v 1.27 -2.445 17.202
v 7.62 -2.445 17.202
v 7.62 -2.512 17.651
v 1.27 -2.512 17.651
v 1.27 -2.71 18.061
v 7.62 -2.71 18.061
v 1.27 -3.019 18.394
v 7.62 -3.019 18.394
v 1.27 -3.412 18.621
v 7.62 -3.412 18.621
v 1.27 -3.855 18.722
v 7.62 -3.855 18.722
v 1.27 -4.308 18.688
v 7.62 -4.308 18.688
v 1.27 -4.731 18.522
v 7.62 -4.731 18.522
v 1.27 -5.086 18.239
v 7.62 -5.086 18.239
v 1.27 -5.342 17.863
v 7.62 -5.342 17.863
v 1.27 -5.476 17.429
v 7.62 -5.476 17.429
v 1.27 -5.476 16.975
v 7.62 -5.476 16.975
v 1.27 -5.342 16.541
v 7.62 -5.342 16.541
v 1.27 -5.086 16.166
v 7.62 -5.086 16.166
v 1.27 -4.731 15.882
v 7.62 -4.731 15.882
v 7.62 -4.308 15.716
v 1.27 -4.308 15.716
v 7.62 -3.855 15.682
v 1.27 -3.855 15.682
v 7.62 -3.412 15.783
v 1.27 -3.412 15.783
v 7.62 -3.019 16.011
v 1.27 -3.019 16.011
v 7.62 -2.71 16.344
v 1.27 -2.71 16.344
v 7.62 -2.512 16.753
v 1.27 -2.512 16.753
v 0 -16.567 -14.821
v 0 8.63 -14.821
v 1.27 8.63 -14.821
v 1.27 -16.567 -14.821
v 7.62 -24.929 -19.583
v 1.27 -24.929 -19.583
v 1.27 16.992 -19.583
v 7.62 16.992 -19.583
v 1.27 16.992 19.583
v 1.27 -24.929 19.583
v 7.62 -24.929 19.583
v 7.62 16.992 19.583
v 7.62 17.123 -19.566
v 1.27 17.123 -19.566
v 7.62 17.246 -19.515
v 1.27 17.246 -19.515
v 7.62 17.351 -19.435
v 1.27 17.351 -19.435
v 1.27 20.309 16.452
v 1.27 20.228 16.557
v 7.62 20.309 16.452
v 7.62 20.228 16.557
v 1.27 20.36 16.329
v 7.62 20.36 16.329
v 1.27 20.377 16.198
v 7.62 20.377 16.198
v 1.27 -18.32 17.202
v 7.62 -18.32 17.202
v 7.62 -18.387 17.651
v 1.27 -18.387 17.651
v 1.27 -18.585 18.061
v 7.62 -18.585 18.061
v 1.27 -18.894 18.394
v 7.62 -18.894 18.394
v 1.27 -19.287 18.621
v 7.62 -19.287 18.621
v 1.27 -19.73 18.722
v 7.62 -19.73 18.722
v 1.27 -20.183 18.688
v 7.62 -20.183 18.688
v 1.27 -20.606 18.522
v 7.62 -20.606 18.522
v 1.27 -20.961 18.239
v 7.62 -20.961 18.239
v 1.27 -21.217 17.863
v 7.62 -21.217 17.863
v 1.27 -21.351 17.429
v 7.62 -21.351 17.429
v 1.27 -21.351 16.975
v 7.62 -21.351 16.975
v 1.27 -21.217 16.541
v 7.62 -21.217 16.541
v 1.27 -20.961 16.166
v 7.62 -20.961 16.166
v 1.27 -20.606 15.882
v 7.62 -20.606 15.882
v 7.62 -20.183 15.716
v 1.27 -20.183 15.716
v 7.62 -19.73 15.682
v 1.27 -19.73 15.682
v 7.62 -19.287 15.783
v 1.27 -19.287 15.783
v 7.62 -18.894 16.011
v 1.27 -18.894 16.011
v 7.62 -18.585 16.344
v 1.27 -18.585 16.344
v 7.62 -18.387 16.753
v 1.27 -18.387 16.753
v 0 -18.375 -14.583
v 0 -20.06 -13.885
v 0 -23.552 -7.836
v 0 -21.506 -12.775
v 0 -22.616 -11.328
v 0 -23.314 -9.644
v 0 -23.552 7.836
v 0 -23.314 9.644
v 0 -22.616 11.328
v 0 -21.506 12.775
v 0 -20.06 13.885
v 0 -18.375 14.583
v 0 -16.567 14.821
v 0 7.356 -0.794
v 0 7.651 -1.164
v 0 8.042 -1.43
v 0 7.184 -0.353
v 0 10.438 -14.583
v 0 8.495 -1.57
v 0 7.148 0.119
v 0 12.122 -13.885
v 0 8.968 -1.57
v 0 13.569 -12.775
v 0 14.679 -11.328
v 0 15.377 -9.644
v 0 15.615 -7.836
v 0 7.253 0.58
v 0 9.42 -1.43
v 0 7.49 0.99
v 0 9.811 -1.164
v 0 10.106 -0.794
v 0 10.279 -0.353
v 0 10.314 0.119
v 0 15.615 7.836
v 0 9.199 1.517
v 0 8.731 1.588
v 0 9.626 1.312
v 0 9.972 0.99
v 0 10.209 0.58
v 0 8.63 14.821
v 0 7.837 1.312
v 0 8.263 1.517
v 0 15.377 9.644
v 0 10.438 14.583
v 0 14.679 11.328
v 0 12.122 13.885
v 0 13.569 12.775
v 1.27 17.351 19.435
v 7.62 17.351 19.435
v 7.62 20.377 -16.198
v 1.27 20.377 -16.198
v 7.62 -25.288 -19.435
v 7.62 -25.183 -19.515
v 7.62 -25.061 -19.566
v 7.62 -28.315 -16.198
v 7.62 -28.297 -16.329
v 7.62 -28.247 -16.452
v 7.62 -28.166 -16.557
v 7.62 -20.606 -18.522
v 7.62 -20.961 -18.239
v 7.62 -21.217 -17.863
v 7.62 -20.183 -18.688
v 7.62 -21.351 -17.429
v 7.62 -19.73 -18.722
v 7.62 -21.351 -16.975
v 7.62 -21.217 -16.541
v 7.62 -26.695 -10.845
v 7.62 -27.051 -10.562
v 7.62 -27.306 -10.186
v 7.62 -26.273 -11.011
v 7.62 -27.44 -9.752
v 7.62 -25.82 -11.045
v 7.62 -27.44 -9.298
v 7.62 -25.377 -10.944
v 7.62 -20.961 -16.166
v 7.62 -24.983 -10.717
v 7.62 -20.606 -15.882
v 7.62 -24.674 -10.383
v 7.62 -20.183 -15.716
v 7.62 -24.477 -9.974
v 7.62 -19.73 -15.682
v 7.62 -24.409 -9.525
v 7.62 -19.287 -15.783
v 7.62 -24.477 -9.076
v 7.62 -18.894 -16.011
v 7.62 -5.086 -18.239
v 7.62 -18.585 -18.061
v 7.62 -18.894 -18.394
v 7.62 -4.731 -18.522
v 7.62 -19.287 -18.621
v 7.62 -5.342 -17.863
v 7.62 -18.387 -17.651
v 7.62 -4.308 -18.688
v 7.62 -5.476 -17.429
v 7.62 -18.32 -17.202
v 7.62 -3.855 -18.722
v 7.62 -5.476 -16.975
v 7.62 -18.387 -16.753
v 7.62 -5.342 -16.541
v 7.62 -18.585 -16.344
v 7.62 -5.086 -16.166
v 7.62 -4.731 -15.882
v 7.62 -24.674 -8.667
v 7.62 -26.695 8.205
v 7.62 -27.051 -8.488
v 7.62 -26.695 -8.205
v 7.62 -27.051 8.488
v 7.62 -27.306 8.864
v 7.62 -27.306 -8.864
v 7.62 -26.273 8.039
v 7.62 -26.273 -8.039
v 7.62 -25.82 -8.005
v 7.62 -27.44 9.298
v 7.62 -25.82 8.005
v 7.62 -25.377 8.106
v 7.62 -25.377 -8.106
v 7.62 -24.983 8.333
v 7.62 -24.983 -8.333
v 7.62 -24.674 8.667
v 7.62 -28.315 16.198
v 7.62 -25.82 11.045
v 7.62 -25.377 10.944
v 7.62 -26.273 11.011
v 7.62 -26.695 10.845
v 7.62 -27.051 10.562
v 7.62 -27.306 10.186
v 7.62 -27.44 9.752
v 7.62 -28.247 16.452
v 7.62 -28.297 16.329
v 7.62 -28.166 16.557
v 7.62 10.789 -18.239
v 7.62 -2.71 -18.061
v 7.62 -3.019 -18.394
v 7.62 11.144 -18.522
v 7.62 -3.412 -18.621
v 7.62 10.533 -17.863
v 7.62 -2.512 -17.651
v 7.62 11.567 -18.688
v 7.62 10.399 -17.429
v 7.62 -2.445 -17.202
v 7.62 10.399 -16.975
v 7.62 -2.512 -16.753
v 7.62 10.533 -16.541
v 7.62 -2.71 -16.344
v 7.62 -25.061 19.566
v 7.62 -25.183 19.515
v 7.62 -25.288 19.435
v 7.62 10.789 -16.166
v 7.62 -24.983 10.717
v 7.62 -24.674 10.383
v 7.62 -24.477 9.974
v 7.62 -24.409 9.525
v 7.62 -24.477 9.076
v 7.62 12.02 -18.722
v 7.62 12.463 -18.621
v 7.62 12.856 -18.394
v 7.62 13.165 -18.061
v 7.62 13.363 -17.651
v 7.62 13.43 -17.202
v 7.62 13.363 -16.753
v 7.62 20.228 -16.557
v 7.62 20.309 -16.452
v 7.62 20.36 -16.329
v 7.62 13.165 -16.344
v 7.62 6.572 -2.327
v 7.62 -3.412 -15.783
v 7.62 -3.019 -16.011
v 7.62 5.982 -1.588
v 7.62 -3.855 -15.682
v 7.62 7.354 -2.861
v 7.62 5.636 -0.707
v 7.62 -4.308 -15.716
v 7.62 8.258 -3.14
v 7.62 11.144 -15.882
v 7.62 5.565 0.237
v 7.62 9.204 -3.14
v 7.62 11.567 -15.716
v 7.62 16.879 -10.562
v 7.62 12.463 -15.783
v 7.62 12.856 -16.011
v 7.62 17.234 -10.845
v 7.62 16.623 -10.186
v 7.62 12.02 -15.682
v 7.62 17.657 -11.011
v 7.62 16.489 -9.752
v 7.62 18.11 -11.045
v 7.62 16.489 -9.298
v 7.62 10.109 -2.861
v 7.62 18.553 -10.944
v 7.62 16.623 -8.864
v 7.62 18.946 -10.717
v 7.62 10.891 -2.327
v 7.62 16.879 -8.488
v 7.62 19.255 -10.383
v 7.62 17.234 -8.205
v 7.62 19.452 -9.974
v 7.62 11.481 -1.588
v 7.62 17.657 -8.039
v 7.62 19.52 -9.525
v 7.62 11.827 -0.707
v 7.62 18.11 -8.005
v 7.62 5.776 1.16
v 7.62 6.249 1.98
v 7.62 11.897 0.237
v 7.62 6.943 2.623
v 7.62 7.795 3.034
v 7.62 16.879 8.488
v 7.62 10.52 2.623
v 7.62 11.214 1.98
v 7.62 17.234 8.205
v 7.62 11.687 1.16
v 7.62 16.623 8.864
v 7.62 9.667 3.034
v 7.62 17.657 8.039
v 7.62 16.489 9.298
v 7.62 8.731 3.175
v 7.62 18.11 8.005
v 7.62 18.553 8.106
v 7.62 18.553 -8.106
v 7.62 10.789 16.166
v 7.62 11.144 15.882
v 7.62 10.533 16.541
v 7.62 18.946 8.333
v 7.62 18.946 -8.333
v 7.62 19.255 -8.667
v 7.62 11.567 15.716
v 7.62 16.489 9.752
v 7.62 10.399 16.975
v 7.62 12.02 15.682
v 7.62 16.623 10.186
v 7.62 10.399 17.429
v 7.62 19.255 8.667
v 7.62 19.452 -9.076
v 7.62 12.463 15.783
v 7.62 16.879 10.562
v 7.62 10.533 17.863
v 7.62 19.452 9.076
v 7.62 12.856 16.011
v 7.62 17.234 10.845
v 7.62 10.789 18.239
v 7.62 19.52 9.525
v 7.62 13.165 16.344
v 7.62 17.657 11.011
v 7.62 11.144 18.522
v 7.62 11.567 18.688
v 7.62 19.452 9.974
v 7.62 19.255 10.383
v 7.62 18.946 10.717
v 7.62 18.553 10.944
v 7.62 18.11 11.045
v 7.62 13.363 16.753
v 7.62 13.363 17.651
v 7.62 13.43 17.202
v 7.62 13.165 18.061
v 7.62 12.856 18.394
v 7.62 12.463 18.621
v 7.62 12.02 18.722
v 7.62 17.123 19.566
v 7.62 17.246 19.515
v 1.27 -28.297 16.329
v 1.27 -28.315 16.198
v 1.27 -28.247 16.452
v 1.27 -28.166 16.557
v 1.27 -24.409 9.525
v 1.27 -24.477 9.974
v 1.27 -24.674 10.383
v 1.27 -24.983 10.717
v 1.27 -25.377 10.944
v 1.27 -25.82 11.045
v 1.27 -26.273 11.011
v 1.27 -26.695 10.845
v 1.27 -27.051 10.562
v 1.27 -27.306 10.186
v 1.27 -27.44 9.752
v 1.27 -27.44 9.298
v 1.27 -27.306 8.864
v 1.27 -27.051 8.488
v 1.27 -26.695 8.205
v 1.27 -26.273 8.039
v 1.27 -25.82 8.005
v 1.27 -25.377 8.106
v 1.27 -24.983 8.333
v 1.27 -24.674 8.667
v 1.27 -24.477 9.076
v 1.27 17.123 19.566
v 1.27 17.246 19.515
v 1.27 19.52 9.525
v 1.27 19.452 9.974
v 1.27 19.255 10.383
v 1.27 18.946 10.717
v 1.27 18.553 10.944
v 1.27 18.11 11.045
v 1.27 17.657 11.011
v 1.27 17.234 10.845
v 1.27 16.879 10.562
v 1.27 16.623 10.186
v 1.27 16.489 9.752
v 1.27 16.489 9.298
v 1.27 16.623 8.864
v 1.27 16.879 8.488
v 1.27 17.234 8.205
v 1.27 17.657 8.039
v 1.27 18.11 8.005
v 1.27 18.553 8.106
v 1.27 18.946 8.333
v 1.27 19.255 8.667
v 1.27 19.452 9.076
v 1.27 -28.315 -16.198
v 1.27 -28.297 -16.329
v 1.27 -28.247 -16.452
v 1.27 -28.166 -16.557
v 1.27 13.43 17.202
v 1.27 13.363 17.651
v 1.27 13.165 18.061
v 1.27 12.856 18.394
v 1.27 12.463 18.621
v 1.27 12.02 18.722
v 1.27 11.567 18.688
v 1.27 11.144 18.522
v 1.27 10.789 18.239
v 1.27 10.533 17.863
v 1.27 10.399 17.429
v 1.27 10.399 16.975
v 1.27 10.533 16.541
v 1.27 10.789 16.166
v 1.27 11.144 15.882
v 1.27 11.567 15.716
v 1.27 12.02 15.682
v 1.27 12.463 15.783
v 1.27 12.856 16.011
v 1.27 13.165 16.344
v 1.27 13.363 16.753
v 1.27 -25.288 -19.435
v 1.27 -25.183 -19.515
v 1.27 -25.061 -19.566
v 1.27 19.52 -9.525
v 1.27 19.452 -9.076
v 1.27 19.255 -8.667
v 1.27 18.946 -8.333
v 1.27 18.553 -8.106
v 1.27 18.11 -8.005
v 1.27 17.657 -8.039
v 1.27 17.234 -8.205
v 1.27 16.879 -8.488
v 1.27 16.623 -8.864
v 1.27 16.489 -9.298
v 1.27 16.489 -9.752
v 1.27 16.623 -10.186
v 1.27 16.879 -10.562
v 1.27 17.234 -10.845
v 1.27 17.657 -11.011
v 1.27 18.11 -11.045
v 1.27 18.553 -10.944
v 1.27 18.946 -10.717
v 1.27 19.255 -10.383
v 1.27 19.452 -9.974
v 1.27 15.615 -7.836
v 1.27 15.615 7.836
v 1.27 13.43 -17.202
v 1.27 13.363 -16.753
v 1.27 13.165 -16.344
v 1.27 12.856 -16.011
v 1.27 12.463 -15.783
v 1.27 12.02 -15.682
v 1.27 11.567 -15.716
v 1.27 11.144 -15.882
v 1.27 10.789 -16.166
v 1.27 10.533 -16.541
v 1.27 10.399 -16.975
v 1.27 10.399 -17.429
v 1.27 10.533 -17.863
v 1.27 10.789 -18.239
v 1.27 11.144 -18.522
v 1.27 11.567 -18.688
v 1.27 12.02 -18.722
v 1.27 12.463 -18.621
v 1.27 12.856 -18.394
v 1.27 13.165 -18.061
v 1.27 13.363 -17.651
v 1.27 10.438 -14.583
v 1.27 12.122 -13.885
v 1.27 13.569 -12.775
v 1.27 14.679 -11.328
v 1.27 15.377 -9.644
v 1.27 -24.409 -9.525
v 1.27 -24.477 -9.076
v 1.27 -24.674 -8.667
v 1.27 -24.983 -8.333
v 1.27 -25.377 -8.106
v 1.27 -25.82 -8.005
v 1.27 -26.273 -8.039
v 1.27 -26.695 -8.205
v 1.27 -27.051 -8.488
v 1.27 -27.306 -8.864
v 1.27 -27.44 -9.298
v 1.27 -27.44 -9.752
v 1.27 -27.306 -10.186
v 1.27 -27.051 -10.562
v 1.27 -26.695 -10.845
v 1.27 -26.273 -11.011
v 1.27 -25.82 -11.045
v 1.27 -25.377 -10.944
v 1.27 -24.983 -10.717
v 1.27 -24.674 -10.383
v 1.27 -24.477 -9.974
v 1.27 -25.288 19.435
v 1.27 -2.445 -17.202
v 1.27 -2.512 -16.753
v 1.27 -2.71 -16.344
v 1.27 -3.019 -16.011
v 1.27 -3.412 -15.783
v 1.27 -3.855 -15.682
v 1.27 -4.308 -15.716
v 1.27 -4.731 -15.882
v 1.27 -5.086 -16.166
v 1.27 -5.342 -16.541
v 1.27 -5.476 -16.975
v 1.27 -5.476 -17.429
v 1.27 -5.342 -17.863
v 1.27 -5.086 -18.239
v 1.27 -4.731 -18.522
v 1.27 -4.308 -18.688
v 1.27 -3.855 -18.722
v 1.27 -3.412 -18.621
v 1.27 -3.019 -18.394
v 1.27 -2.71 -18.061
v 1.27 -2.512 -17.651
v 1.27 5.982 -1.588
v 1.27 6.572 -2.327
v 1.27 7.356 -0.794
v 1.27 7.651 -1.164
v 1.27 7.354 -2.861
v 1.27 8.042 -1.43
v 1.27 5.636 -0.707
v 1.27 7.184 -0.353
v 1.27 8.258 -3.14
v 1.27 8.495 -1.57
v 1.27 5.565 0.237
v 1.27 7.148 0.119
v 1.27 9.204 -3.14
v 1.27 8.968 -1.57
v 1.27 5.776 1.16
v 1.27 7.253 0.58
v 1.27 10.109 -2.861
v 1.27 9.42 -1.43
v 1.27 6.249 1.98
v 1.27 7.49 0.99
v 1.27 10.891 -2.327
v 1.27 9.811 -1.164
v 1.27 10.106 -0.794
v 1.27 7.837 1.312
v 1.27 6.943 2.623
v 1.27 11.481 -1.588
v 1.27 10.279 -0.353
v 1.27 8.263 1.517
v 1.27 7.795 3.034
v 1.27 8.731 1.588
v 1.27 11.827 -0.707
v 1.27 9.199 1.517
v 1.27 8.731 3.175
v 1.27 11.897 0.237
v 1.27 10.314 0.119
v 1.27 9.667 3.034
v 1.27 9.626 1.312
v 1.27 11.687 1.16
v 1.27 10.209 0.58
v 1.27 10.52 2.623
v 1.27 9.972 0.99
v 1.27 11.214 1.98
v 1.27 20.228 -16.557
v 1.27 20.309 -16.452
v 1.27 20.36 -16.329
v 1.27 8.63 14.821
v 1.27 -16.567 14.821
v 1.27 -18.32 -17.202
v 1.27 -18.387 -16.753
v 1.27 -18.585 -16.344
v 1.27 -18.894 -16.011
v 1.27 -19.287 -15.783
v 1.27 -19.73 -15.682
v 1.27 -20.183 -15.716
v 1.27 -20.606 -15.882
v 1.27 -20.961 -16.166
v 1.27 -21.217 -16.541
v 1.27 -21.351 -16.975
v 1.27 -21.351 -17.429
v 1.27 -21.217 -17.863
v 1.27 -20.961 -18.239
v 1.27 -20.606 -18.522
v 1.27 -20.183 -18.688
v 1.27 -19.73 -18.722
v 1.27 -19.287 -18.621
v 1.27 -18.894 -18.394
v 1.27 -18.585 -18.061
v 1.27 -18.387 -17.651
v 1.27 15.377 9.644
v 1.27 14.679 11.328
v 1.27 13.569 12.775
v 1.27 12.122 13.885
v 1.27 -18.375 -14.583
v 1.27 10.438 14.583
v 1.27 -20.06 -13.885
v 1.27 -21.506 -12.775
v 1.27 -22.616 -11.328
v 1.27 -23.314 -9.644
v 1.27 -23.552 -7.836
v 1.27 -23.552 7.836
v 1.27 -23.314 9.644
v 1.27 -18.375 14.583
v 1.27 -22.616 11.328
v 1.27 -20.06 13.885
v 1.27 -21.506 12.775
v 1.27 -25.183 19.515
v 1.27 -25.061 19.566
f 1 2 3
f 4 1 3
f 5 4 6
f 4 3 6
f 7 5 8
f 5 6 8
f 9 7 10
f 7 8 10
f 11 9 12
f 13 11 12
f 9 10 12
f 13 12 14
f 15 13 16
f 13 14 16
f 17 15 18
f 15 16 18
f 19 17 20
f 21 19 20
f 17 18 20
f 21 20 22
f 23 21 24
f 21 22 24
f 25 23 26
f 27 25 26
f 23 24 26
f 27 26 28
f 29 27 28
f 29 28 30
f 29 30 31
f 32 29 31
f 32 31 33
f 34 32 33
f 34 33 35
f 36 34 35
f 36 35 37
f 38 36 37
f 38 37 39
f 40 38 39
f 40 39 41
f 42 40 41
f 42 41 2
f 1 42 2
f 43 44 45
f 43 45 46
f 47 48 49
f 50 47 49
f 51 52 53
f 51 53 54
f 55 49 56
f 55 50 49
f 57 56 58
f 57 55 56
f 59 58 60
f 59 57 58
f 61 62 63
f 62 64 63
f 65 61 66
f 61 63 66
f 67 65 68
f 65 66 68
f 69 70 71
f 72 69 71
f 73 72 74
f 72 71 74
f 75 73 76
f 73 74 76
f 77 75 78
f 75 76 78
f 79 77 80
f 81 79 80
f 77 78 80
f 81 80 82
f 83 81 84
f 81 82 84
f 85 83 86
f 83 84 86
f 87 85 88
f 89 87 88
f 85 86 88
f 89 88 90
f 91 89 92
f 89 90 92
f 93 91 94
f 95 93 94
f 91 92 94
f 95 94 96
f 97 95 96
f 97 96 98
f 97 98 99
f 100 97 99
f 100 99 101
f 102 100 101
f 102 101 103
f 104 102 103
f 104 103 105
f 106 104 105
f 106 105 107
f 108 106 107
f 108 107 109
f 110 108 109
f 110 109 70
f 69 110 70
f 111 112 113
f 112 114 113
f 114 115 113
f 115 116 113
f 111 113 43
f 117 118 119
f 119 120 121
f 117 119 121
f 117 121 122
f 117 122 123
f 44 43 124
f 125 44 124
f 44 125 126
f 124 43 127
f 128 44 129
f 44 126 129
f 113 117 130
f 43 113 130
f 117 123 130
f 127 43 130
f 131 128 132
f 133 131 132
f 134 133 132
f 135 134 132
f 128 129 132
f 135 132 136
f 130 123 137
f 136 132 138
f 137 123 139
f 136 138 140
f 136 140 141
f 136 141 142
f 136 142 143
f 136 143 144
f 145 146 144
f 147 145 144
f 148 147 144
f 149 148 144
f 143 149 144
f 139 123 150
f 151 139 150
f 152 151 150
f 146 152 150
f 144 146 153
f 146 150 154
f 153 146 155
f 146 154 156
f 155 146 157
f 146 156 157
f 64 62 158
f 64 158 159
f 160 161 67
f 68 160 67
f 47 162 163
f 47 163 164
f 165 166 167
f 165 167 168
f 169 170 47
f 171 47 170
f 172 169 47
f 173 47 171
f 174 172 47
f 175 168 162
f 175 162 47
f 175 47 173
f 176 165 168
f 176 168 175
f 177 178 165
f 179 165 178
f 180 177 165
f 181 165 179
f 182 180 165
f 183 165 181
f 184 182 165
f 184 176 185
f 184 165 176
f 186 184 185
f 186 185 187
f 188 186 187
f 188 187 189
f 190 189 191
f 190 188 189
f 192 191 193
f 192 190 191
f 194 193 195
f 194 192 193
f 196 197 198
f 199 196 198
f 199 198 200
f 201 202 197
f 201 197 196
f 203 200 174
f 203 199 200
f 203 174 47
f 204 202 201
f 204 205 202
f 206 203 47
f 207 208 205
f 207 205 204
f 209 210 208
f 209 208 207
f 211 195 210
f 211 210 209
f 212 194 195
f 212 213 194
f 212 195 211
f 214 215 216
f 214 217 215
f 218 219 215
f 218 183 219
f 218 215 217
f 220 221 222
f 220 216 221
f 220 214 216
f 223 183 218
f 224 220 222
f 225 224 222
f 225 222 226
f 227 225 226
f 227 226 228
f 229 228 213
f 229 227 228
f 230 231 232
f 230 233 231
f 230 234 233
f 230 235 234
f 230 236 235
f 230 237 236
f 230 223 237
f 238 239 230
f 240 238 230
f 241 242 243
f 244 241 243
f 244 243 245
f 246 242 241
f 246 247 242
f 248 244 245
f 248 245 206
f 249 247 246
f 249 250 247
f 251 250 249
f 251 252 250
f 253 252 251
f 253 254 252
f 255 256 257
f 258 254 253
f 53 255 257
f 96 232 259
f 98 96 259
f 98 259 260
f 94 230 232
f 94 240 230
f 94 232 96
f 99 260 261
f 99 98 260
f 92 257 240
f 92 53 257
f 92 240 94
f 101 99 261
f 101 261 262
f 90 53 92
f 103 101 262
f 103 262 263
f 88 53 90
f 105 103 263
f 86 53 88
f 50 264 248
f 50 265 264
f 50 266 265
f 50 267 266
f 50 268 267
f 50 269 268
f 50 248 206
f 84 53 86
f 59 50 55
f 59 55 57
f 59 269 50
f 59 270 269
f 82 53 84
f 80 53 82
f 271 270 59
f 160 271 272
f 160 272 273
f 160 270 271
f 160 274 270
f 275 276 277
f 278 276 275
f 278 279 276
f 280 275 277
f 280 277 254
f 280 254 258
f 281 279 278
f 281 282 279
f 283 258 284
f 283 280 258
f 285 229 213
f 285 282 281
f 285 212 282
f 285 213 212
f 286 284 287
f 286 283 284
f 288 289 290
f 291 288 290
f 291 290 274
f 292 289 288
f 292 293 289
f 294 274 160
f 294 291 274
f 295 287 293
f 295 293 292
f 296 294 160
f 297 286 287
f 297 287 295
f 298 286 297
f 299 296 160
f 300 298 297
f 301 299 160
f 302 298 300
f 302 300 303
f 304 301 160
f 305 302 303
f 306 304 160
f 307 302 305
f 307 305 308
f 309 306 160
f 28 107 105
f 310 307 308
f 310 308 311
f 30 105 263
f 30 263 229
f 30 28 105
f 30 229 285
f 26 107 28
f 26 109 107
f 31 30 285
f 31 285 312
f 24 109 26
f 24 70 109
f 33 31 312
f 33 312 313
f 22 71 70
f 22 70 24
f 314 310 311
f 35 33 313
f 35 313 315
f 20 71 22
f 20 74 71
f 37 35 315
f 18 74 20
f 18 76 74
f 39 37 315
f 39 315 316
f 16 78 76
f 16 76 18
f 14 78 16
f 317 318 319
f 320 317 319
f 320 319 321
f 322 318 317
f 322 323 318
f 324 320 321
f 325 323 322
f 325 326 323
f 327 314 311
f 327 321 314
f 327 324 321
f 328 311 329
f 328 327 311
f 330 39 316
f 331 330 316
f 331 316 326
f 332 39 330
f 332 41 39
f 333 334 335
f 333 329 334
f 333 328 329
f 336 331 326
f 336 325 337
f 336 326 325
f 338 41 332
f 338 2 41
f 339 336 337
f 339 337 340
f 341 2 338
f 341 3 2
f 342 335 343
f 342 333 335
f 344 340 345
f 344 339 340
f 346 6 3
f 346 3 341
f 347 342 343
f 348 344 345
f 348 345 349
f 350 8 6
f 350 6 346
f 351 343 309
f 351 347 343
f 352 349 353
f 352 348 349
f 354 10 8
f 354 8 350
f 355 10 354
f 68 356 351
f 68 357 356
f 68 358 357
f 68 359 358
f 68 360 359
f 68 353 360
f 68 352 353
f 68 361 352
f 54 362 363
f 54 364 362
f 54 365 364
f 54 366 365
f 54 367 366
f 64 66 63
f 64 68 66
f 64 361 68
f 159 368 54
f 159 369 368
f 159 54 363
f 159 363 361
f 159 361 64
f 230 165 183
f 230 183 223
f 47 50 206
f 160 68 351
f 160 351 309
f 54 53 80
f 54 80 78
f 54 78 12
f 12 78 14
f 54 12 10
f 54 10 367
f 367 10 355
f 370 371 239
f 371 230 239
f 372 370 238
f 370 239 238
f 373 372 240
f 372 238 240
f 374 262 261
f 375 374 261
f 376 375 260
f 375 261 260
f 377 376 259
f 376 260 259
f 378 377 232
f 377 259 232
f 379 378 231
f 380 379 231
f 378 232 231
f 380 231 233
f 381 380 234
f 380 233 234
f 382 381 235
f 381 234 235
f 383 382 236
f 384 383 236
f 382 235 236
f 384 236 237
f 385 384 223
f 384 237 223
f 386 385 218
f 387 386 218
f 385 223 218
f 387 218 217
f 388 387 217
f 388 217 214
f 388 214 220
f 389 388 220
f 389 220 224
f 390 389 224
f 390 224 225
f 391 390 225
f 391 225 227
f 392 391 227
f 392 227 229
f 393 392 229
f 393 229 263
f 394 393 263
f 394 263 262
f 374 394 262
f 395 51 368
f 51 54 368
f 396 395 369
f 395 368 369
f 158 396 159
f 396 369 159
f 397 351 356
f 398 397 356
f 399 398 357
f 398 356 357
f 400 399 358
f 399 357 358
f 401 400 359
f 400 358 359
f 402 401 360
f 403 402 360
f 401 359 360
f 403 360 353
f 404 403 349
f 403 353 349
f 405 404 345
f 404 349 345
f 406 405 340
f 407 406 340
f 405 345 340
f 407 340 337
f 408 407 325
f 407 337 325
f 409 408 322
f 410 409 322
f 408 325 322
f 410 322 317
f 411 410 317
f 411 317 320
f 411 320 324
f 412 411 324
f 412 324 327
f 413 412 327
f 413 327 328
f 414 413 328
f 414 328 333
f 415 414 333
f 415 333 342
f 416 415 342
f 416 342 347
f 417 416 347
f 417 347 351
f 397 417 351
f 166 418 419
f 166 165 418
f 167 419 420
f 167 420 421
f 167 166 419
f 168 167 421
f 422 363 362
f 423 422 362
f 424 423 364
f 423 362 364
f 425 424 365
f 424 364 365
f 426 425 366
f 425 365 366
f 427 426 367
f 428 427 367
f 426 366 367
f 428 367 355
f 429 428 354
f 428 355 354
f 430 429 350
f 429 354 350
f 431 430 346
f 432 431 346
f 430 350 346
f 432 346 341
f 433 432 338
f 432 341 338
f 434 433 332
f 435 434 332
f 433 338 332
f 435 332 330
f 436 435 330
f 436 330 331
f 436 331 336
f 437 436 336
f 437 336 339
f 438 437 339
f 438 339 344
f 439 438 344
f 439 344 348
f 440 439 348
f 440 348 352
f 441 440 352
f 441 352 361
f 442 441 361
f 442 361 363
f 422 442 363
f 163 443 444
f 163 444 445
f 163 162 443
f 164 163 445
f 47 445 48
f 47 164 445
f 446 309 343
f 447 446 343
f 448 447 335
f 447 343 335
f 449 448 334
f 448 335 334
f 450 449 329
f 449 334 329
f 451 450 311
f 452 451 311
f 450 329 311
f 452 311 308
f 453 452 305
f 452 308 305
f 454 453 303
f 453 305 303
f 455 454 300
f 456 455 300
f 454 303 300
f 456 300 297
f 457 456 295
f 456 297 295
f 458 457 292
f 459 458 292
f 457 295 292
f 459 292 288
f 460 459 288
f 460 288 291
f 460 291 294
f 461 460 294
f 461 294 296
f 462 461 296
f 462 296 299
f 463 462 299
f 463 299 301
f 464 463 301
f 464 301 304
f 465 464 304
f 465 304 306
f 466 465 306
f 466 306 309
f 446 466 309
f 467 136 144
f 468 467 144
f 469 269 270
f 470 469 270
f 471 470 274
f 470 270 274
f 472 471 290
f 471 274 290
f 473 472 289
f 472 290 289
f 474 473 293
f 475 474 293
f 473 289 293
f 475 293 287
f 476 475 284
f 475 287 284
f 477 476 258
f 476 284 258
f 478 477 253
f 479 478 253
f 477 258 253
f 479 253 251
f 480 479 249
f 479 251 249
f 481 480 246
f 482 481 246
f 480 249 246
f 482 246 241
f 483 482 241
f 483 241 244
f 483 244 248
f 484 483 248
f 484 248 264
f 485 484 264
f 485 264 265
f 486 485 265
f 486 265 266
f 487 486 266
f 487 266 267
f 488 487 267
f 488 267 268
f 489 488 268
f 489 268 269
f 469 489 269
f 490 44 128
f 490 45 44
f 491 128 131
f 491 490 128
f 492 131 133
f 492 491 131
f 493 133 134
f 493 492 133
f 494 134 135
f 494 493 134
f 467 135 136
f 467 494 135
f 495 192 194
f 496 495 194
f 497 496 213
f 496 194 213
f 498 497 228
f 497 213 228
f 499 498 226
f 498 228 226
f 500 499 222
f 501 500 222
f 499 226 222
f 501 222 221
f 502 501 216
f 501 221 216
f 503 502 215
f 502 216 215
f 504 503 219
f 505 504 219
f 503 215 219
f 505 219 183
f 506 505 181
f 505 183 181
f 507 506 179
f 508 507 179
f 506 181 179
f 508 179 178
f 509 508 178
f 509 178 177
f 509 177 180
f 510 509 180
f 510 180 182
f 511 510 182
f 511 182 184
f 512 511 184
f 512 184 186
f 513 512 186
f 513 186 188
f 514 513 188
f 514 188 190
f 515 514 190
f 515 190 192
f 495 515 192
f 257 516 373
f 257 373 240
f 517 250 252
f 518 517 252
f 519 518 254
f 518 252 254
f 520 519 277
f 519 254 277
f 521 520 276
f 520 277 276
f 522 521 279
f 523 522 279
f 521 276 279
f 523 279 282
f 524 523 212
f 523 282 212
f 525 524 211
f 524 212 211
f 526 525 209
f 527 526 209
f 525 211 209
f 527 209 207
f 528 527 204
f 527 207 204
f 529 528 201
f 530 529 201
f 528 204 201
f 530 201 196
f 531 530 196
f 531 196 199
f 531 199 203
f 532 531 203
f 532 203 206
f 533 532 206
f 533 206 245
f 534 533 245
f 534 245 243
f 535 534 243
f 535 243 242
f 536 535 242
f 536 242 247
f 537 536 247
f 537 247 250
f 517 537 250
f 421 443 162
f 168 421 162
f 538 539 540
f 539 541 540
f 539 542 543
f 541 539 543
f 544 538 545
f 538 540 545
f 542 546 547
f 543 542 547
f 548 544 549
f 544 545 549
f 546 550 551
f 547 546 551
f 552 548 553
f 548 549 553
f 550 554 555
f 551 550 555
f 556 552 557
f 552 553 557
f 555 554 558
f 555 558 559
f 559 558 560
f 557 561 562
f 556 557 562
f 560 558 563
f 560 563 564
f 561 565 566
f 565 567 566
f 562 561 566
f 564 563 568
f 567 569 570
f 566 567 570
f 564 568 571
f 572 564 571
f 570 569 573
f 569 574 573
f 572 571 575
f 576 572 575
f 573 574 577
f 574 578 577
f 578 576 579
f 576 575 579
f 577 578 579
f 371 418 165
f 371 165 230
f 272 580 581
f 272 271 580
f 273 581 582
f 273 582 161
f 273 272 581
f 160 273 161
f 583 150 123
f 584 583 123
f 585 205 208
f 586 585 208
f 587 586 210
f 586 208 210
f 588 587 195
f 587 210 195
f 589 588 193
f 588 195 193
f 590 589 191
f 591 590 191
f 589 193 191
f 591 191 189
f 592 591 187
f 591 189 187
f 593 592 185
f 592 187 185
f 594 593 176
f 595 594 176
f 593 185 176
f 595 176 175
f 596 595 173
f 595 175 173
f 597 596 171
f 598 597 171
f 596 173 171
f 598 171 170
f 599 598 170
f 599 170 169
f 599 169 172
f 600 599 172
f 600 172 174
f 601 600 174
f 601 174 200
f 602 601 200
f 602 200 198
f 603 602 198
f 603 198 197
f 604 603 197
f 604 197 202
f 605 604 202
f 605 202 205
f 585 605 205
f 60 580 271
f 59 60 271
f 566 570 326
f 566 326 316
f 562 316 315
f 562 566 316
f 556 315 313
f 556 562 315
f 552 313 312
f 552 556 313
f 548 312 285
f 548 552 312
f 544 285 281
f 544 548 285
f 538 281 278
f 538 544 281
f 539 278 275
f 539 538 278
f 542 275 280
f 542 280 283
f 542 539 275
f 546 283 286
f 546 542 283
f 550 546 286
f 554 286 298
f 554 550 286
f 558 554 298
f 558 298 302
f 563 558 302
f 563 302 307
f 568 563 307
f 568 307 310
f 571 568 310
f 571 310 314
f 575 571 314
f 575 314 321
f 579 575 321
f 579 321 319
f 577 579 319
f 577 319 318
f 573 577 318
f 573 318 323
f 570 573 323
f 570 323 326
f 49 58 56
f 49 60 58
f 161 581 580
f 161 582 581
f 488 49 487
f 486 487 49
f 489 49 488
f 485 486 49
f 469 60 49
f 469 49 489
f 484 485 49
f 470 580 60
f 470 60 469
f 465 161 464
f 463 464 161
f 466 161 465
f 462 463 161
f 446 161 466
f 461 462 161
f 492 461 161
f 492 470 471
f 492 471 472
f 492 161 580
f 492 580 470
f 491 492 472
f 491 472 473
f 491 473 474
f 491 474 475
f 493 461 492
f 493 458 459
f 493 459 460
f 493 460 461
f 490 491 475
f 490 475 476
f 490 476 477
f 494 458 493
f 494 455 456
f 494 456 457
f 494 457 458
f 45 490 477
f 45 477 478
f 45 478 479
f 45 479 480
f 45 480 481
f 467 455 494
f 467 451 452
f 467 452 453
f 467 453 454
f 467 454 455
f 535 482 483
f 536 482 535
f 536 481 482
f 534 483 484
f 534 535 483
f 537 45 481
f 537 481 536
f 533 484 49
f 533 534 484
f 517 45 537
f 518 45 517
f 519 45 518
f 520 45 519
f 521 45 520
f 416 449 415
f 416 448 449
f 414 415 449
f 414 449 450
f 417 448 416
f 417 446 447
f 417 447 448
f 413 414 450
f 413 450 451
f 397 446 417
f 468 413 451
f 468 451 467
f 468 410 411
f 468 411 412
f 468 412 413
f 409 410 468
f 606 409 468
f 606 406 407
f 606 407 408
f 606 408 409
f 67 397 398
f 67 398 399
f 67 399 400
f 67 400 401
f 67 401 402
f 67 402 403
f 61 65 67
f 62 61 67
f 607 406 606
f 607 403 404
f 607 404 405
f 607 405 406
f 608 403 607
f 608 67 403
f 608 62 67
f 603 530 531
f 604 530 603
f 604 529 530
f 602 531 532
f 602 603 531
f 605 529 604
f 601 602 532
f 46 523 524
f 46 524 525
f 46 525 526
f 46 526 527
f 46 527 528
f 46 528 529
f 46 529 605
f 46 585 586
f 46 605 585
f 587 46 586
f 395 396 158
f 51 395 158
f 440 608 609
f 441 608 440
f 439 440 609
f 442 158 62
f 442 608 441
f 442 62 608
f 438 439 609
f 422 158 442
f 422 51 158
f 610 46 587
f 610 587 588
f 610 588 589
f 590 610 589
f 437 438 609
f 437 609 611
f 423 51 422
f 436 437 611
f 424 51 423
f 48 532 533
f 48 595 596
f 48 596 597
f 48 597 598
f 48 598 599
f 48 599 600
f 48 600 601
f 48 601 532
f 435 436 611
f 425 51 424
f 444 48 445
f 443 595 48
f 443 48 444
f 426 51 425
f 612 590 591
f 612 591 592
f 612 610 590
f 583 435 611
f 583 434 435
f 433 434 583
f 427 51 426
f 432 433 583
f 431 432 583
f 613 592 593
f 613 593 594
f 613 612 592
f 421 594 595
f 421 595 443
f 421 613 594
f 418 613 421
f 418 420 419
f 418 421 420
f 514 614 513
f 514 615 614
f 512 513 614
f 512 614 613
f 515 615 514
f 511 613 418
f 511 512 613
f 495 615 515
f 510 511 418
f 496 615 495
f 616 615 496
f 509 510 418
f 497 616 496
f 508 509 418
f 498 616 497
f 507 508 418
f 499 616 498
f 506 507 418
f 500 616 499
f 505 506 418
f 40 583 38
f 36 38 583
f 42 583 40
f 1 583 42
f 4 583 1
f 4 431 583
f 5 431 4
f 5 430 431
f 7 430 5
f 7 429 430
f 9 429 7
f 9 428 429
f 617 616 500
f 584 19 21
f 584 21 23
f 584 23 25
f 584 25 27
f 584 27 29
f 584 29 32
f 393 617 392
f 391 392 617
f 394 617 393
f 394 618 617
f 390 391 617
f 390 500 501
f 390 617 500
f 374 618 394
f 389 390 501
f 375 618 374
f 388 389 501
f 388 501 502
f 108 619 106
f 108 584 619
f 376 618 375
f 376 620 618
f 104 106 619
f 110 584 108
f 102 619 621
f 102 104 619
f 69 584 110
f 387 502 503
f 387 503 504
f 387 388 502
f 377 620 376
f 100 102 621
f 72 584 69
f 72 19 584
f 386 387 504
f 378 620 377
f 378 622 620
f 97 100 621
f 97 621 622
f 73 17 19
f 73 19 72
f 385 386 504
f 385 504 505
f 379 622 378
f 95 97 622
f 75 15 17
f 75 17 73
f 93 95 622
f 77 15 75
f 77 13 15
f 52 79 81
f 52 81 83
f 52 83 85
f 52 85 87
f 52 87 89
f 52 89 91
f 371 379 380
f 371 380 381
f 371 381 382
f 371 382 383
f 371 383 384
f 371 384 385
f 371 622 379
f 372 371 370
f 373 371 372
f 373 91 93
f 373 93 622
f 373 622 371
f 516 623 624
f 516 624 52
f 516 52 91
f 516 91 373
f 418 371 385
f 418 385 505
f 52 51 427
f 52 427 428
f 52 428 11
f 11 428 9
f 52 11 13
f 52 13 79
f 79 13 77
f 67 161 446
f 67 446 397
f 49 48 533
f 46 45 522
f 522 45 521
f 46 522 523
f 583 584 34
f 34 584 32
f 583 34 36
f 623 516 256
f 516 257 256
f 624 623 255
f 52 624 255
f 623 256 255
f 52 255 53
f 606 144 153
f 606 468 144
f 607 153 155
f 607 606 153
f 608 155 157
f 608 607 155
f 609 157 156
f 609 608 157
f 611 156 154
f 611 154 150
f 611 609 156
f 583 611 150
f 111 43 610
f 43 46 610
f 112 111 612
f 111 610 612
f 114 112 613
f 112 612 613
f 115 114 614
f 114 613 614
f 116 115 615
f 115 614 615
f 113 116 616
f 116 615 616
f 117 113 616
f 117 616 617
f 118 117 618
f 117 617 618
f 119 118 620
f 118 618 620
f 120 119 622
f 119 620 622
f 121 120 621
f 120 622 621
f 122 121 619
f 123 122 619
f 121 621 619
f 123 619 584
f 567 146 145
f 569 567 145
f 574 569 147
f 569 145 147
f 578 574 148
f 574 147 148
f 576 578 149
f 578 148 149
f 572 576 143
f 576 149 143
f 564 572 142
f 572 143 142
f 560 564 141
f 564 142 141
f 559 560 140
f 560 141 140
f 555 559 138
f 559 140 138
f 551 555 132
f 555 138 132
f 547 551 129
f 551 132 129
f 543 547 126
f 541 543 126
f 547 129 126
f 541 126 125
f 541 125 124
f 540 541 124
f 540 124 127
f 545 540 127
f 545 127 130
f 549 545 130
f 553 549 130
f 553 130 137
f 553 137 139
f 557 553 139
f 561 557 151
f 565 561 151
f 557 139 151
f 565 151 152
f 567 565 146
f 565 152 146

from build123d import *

# Parameters (mm, degrees)
SKETCH1_W             = 48.6918
SKETCH1_H             = 39.1668
SKETCH1_R             = 4.7625
SKETCH1_R_2           = 3.175
BOSS_EXTRUDE1_DEPTH   = 7.62
CHAMFER1_SIZE         = 3.175
SKETCH3_W             = 39.1668
SKETCH3_H             = 29.6418
CUT_EXTRUDE2_DEPTH    = 1.27
F_4_CLEARANCE_HOLE1_D = 3.048
SKETCH7_R             = 4.415840843
SKETCH7_R_2           = 3.175
SKETCH7_R_3           = 1.5875
BOSS_EXTRUDE2_DEPTH   = 1.27
SKETCH15_R            = 6.0325
BOSS_EXTRUDE7_DEPTH   = 7.62
FILLET3_R             = 6.985
FILLET4_R             = 0.508


with BuildPart() as part:
    # Sketch1 → Boss-Extrude1 (new body)
    with BuildSketch(Plane.YZ):
        with Locations((-3.96875, 0)):
            Rectangle(SKETCH1_W, SKETCH1_H)
        with Locations(Location((-8.73125, 0, 0), (0, 0, 90))):
            Circle(SKETCH1_R, mode=Mode.SUBTRACT)
        with Locations(Location((8.73125, 0, 0), (0, 0, 90))):
            Circle(SKETCH1_R_2, mode=Mode.SUBTRACT)
    extrude(amount=BOSS_EXTRUDE1_DEPTH)

    # Chamfer1
    chamfer1_edges = [part.edges().sort_by_distance(p)[0] for p in [
        (3.81, 20.37715, -19.5834),
        (3.81, -28.31465, -19.5834),
        (3.81, -28.31465, 19.5834),
        (3.81, 20.37715, 19.5834),
    ]]
    chamfer(chamfer1_edges, length=CHAMFER1_SIZE)

    # Sketch3 → Cut-Extrude2 (cut)
    with BuildSketch(Plane(origin=(0, 0, 0), x_dir=(0, -1, 0), z_dir=(-1, 0, 0))):
        Polygon((-18.254252448, -22.1234), (26.191752448, -22.1234), (30.85465, -17.460502448), (30.85465, 17.460502448), (26.191752448, 22.1234), (-18.254252448, 22.1234), (-22.91715, 17.460502448), (-22.91715, -17.460502448), align=None)
        with Locations((3.96875, 0)):
            Rectangle(SKETCH3_W, SKETCH3_H, mode=Mode.SUBTRACT)
    extrude(amount=-CUT_EXTRUDE2_DEPTH, mode=Mode.SUBTRACT)

    # #4 Clearance Hole1 (through all)
    with Locations(Plane(origin=(1.27, 0, 0), x_dir=(0, -1, 0), z_dir=(-1, 0, 0))):
        with Locations((-17.9959, 9.525), (-11.90625, 17.20215), (3.96875, 17.20215), (19.84375, 17.20215), (25.9334, 9.525), (25.9334, -9.525), (19.84375, -17.20215), (3.96875, -17.20215), (-11.90625, -17.20215), (-17.9959, -9.525)):
            Hole(F_4_CLEARANCE_HOLE1_D / 2)

    # Sketch7 → Boss-Extrude2 (add)
    # profile 1 of 2: a face of its own
    with BuildSketch(Plane(origin=(0, 0, 0), x_dir=(0, -1, 0), z_dir=(-1, 0, 0))):
        with Locations((-8.73125, 0)):
            Circle(SKETCH7_R)
        with Locations(Location((-8.73125, 0, 0), (0, 0, 90))):
            Circle(SKETCH7_R_2, mode=Mode.SUBTRACT)
    # profile 2 of 2: a face of its own
    with BuildSketch(Plane(origin=(0, 0, 0), x_dir=(0, -1, 0), z_dir=(-1, 0, 0))):
        with Locations(Location((-8.73125, 0, 0), (0, 0, 90))):
            Circle(SKETCH7_R_2)
        with Locations(Location((-8.73125, 0, 0), (0, 0, 90))):
            Circle(SKETCH7_R_3, mode=Mode.SUBTRACT)
    extrude(amount=-BOSS_EXTRUDE2_DEPTH)

    # Sketch15 → Boss-Extrude7 (add)
    with BuildSketch(Plane.YZ.offset(7.62)):
        with Locations((-8.73125, 0)):
            Circle(SKETCH15_R)
    extrude(amount=-BOSS_EXTRUDE7_DEPTH)

    # Fillet3
    fillet3_edges = [part.edges().sort_by_distance(p)[0] for p in [
        (0.635, 15.61465, 14.8209),
        (0.635, -23.55215, 14.8209),
        (0.635, -23.55215, -14.8209),
        (0.635, 15.61465, -14.8209),
    ]]
    fillet(fillet3_edges, radius=FILLET3_R)

    # Fillet4
    fillet4_edges = [part.edges().sort_by_distance(p)[0] for p in [
        (4.445, -25.13965, -19.5834),
        (4.445, -28.31465, 16.4084),
        (4.445, 20.37715, -16.4084),
        (4.445, 17.20215, 19.5834),
        (4.445, -25.13965, 19.5834),
        (4.445, 20.37715, 16.4084),
        (4.445, 17.20215, -19.5834),
        (4.445, -28.31465, -16.4084),
    ]]
    fillet(fillet4_edges, radius=FILLET4_R)


solid = part.part
